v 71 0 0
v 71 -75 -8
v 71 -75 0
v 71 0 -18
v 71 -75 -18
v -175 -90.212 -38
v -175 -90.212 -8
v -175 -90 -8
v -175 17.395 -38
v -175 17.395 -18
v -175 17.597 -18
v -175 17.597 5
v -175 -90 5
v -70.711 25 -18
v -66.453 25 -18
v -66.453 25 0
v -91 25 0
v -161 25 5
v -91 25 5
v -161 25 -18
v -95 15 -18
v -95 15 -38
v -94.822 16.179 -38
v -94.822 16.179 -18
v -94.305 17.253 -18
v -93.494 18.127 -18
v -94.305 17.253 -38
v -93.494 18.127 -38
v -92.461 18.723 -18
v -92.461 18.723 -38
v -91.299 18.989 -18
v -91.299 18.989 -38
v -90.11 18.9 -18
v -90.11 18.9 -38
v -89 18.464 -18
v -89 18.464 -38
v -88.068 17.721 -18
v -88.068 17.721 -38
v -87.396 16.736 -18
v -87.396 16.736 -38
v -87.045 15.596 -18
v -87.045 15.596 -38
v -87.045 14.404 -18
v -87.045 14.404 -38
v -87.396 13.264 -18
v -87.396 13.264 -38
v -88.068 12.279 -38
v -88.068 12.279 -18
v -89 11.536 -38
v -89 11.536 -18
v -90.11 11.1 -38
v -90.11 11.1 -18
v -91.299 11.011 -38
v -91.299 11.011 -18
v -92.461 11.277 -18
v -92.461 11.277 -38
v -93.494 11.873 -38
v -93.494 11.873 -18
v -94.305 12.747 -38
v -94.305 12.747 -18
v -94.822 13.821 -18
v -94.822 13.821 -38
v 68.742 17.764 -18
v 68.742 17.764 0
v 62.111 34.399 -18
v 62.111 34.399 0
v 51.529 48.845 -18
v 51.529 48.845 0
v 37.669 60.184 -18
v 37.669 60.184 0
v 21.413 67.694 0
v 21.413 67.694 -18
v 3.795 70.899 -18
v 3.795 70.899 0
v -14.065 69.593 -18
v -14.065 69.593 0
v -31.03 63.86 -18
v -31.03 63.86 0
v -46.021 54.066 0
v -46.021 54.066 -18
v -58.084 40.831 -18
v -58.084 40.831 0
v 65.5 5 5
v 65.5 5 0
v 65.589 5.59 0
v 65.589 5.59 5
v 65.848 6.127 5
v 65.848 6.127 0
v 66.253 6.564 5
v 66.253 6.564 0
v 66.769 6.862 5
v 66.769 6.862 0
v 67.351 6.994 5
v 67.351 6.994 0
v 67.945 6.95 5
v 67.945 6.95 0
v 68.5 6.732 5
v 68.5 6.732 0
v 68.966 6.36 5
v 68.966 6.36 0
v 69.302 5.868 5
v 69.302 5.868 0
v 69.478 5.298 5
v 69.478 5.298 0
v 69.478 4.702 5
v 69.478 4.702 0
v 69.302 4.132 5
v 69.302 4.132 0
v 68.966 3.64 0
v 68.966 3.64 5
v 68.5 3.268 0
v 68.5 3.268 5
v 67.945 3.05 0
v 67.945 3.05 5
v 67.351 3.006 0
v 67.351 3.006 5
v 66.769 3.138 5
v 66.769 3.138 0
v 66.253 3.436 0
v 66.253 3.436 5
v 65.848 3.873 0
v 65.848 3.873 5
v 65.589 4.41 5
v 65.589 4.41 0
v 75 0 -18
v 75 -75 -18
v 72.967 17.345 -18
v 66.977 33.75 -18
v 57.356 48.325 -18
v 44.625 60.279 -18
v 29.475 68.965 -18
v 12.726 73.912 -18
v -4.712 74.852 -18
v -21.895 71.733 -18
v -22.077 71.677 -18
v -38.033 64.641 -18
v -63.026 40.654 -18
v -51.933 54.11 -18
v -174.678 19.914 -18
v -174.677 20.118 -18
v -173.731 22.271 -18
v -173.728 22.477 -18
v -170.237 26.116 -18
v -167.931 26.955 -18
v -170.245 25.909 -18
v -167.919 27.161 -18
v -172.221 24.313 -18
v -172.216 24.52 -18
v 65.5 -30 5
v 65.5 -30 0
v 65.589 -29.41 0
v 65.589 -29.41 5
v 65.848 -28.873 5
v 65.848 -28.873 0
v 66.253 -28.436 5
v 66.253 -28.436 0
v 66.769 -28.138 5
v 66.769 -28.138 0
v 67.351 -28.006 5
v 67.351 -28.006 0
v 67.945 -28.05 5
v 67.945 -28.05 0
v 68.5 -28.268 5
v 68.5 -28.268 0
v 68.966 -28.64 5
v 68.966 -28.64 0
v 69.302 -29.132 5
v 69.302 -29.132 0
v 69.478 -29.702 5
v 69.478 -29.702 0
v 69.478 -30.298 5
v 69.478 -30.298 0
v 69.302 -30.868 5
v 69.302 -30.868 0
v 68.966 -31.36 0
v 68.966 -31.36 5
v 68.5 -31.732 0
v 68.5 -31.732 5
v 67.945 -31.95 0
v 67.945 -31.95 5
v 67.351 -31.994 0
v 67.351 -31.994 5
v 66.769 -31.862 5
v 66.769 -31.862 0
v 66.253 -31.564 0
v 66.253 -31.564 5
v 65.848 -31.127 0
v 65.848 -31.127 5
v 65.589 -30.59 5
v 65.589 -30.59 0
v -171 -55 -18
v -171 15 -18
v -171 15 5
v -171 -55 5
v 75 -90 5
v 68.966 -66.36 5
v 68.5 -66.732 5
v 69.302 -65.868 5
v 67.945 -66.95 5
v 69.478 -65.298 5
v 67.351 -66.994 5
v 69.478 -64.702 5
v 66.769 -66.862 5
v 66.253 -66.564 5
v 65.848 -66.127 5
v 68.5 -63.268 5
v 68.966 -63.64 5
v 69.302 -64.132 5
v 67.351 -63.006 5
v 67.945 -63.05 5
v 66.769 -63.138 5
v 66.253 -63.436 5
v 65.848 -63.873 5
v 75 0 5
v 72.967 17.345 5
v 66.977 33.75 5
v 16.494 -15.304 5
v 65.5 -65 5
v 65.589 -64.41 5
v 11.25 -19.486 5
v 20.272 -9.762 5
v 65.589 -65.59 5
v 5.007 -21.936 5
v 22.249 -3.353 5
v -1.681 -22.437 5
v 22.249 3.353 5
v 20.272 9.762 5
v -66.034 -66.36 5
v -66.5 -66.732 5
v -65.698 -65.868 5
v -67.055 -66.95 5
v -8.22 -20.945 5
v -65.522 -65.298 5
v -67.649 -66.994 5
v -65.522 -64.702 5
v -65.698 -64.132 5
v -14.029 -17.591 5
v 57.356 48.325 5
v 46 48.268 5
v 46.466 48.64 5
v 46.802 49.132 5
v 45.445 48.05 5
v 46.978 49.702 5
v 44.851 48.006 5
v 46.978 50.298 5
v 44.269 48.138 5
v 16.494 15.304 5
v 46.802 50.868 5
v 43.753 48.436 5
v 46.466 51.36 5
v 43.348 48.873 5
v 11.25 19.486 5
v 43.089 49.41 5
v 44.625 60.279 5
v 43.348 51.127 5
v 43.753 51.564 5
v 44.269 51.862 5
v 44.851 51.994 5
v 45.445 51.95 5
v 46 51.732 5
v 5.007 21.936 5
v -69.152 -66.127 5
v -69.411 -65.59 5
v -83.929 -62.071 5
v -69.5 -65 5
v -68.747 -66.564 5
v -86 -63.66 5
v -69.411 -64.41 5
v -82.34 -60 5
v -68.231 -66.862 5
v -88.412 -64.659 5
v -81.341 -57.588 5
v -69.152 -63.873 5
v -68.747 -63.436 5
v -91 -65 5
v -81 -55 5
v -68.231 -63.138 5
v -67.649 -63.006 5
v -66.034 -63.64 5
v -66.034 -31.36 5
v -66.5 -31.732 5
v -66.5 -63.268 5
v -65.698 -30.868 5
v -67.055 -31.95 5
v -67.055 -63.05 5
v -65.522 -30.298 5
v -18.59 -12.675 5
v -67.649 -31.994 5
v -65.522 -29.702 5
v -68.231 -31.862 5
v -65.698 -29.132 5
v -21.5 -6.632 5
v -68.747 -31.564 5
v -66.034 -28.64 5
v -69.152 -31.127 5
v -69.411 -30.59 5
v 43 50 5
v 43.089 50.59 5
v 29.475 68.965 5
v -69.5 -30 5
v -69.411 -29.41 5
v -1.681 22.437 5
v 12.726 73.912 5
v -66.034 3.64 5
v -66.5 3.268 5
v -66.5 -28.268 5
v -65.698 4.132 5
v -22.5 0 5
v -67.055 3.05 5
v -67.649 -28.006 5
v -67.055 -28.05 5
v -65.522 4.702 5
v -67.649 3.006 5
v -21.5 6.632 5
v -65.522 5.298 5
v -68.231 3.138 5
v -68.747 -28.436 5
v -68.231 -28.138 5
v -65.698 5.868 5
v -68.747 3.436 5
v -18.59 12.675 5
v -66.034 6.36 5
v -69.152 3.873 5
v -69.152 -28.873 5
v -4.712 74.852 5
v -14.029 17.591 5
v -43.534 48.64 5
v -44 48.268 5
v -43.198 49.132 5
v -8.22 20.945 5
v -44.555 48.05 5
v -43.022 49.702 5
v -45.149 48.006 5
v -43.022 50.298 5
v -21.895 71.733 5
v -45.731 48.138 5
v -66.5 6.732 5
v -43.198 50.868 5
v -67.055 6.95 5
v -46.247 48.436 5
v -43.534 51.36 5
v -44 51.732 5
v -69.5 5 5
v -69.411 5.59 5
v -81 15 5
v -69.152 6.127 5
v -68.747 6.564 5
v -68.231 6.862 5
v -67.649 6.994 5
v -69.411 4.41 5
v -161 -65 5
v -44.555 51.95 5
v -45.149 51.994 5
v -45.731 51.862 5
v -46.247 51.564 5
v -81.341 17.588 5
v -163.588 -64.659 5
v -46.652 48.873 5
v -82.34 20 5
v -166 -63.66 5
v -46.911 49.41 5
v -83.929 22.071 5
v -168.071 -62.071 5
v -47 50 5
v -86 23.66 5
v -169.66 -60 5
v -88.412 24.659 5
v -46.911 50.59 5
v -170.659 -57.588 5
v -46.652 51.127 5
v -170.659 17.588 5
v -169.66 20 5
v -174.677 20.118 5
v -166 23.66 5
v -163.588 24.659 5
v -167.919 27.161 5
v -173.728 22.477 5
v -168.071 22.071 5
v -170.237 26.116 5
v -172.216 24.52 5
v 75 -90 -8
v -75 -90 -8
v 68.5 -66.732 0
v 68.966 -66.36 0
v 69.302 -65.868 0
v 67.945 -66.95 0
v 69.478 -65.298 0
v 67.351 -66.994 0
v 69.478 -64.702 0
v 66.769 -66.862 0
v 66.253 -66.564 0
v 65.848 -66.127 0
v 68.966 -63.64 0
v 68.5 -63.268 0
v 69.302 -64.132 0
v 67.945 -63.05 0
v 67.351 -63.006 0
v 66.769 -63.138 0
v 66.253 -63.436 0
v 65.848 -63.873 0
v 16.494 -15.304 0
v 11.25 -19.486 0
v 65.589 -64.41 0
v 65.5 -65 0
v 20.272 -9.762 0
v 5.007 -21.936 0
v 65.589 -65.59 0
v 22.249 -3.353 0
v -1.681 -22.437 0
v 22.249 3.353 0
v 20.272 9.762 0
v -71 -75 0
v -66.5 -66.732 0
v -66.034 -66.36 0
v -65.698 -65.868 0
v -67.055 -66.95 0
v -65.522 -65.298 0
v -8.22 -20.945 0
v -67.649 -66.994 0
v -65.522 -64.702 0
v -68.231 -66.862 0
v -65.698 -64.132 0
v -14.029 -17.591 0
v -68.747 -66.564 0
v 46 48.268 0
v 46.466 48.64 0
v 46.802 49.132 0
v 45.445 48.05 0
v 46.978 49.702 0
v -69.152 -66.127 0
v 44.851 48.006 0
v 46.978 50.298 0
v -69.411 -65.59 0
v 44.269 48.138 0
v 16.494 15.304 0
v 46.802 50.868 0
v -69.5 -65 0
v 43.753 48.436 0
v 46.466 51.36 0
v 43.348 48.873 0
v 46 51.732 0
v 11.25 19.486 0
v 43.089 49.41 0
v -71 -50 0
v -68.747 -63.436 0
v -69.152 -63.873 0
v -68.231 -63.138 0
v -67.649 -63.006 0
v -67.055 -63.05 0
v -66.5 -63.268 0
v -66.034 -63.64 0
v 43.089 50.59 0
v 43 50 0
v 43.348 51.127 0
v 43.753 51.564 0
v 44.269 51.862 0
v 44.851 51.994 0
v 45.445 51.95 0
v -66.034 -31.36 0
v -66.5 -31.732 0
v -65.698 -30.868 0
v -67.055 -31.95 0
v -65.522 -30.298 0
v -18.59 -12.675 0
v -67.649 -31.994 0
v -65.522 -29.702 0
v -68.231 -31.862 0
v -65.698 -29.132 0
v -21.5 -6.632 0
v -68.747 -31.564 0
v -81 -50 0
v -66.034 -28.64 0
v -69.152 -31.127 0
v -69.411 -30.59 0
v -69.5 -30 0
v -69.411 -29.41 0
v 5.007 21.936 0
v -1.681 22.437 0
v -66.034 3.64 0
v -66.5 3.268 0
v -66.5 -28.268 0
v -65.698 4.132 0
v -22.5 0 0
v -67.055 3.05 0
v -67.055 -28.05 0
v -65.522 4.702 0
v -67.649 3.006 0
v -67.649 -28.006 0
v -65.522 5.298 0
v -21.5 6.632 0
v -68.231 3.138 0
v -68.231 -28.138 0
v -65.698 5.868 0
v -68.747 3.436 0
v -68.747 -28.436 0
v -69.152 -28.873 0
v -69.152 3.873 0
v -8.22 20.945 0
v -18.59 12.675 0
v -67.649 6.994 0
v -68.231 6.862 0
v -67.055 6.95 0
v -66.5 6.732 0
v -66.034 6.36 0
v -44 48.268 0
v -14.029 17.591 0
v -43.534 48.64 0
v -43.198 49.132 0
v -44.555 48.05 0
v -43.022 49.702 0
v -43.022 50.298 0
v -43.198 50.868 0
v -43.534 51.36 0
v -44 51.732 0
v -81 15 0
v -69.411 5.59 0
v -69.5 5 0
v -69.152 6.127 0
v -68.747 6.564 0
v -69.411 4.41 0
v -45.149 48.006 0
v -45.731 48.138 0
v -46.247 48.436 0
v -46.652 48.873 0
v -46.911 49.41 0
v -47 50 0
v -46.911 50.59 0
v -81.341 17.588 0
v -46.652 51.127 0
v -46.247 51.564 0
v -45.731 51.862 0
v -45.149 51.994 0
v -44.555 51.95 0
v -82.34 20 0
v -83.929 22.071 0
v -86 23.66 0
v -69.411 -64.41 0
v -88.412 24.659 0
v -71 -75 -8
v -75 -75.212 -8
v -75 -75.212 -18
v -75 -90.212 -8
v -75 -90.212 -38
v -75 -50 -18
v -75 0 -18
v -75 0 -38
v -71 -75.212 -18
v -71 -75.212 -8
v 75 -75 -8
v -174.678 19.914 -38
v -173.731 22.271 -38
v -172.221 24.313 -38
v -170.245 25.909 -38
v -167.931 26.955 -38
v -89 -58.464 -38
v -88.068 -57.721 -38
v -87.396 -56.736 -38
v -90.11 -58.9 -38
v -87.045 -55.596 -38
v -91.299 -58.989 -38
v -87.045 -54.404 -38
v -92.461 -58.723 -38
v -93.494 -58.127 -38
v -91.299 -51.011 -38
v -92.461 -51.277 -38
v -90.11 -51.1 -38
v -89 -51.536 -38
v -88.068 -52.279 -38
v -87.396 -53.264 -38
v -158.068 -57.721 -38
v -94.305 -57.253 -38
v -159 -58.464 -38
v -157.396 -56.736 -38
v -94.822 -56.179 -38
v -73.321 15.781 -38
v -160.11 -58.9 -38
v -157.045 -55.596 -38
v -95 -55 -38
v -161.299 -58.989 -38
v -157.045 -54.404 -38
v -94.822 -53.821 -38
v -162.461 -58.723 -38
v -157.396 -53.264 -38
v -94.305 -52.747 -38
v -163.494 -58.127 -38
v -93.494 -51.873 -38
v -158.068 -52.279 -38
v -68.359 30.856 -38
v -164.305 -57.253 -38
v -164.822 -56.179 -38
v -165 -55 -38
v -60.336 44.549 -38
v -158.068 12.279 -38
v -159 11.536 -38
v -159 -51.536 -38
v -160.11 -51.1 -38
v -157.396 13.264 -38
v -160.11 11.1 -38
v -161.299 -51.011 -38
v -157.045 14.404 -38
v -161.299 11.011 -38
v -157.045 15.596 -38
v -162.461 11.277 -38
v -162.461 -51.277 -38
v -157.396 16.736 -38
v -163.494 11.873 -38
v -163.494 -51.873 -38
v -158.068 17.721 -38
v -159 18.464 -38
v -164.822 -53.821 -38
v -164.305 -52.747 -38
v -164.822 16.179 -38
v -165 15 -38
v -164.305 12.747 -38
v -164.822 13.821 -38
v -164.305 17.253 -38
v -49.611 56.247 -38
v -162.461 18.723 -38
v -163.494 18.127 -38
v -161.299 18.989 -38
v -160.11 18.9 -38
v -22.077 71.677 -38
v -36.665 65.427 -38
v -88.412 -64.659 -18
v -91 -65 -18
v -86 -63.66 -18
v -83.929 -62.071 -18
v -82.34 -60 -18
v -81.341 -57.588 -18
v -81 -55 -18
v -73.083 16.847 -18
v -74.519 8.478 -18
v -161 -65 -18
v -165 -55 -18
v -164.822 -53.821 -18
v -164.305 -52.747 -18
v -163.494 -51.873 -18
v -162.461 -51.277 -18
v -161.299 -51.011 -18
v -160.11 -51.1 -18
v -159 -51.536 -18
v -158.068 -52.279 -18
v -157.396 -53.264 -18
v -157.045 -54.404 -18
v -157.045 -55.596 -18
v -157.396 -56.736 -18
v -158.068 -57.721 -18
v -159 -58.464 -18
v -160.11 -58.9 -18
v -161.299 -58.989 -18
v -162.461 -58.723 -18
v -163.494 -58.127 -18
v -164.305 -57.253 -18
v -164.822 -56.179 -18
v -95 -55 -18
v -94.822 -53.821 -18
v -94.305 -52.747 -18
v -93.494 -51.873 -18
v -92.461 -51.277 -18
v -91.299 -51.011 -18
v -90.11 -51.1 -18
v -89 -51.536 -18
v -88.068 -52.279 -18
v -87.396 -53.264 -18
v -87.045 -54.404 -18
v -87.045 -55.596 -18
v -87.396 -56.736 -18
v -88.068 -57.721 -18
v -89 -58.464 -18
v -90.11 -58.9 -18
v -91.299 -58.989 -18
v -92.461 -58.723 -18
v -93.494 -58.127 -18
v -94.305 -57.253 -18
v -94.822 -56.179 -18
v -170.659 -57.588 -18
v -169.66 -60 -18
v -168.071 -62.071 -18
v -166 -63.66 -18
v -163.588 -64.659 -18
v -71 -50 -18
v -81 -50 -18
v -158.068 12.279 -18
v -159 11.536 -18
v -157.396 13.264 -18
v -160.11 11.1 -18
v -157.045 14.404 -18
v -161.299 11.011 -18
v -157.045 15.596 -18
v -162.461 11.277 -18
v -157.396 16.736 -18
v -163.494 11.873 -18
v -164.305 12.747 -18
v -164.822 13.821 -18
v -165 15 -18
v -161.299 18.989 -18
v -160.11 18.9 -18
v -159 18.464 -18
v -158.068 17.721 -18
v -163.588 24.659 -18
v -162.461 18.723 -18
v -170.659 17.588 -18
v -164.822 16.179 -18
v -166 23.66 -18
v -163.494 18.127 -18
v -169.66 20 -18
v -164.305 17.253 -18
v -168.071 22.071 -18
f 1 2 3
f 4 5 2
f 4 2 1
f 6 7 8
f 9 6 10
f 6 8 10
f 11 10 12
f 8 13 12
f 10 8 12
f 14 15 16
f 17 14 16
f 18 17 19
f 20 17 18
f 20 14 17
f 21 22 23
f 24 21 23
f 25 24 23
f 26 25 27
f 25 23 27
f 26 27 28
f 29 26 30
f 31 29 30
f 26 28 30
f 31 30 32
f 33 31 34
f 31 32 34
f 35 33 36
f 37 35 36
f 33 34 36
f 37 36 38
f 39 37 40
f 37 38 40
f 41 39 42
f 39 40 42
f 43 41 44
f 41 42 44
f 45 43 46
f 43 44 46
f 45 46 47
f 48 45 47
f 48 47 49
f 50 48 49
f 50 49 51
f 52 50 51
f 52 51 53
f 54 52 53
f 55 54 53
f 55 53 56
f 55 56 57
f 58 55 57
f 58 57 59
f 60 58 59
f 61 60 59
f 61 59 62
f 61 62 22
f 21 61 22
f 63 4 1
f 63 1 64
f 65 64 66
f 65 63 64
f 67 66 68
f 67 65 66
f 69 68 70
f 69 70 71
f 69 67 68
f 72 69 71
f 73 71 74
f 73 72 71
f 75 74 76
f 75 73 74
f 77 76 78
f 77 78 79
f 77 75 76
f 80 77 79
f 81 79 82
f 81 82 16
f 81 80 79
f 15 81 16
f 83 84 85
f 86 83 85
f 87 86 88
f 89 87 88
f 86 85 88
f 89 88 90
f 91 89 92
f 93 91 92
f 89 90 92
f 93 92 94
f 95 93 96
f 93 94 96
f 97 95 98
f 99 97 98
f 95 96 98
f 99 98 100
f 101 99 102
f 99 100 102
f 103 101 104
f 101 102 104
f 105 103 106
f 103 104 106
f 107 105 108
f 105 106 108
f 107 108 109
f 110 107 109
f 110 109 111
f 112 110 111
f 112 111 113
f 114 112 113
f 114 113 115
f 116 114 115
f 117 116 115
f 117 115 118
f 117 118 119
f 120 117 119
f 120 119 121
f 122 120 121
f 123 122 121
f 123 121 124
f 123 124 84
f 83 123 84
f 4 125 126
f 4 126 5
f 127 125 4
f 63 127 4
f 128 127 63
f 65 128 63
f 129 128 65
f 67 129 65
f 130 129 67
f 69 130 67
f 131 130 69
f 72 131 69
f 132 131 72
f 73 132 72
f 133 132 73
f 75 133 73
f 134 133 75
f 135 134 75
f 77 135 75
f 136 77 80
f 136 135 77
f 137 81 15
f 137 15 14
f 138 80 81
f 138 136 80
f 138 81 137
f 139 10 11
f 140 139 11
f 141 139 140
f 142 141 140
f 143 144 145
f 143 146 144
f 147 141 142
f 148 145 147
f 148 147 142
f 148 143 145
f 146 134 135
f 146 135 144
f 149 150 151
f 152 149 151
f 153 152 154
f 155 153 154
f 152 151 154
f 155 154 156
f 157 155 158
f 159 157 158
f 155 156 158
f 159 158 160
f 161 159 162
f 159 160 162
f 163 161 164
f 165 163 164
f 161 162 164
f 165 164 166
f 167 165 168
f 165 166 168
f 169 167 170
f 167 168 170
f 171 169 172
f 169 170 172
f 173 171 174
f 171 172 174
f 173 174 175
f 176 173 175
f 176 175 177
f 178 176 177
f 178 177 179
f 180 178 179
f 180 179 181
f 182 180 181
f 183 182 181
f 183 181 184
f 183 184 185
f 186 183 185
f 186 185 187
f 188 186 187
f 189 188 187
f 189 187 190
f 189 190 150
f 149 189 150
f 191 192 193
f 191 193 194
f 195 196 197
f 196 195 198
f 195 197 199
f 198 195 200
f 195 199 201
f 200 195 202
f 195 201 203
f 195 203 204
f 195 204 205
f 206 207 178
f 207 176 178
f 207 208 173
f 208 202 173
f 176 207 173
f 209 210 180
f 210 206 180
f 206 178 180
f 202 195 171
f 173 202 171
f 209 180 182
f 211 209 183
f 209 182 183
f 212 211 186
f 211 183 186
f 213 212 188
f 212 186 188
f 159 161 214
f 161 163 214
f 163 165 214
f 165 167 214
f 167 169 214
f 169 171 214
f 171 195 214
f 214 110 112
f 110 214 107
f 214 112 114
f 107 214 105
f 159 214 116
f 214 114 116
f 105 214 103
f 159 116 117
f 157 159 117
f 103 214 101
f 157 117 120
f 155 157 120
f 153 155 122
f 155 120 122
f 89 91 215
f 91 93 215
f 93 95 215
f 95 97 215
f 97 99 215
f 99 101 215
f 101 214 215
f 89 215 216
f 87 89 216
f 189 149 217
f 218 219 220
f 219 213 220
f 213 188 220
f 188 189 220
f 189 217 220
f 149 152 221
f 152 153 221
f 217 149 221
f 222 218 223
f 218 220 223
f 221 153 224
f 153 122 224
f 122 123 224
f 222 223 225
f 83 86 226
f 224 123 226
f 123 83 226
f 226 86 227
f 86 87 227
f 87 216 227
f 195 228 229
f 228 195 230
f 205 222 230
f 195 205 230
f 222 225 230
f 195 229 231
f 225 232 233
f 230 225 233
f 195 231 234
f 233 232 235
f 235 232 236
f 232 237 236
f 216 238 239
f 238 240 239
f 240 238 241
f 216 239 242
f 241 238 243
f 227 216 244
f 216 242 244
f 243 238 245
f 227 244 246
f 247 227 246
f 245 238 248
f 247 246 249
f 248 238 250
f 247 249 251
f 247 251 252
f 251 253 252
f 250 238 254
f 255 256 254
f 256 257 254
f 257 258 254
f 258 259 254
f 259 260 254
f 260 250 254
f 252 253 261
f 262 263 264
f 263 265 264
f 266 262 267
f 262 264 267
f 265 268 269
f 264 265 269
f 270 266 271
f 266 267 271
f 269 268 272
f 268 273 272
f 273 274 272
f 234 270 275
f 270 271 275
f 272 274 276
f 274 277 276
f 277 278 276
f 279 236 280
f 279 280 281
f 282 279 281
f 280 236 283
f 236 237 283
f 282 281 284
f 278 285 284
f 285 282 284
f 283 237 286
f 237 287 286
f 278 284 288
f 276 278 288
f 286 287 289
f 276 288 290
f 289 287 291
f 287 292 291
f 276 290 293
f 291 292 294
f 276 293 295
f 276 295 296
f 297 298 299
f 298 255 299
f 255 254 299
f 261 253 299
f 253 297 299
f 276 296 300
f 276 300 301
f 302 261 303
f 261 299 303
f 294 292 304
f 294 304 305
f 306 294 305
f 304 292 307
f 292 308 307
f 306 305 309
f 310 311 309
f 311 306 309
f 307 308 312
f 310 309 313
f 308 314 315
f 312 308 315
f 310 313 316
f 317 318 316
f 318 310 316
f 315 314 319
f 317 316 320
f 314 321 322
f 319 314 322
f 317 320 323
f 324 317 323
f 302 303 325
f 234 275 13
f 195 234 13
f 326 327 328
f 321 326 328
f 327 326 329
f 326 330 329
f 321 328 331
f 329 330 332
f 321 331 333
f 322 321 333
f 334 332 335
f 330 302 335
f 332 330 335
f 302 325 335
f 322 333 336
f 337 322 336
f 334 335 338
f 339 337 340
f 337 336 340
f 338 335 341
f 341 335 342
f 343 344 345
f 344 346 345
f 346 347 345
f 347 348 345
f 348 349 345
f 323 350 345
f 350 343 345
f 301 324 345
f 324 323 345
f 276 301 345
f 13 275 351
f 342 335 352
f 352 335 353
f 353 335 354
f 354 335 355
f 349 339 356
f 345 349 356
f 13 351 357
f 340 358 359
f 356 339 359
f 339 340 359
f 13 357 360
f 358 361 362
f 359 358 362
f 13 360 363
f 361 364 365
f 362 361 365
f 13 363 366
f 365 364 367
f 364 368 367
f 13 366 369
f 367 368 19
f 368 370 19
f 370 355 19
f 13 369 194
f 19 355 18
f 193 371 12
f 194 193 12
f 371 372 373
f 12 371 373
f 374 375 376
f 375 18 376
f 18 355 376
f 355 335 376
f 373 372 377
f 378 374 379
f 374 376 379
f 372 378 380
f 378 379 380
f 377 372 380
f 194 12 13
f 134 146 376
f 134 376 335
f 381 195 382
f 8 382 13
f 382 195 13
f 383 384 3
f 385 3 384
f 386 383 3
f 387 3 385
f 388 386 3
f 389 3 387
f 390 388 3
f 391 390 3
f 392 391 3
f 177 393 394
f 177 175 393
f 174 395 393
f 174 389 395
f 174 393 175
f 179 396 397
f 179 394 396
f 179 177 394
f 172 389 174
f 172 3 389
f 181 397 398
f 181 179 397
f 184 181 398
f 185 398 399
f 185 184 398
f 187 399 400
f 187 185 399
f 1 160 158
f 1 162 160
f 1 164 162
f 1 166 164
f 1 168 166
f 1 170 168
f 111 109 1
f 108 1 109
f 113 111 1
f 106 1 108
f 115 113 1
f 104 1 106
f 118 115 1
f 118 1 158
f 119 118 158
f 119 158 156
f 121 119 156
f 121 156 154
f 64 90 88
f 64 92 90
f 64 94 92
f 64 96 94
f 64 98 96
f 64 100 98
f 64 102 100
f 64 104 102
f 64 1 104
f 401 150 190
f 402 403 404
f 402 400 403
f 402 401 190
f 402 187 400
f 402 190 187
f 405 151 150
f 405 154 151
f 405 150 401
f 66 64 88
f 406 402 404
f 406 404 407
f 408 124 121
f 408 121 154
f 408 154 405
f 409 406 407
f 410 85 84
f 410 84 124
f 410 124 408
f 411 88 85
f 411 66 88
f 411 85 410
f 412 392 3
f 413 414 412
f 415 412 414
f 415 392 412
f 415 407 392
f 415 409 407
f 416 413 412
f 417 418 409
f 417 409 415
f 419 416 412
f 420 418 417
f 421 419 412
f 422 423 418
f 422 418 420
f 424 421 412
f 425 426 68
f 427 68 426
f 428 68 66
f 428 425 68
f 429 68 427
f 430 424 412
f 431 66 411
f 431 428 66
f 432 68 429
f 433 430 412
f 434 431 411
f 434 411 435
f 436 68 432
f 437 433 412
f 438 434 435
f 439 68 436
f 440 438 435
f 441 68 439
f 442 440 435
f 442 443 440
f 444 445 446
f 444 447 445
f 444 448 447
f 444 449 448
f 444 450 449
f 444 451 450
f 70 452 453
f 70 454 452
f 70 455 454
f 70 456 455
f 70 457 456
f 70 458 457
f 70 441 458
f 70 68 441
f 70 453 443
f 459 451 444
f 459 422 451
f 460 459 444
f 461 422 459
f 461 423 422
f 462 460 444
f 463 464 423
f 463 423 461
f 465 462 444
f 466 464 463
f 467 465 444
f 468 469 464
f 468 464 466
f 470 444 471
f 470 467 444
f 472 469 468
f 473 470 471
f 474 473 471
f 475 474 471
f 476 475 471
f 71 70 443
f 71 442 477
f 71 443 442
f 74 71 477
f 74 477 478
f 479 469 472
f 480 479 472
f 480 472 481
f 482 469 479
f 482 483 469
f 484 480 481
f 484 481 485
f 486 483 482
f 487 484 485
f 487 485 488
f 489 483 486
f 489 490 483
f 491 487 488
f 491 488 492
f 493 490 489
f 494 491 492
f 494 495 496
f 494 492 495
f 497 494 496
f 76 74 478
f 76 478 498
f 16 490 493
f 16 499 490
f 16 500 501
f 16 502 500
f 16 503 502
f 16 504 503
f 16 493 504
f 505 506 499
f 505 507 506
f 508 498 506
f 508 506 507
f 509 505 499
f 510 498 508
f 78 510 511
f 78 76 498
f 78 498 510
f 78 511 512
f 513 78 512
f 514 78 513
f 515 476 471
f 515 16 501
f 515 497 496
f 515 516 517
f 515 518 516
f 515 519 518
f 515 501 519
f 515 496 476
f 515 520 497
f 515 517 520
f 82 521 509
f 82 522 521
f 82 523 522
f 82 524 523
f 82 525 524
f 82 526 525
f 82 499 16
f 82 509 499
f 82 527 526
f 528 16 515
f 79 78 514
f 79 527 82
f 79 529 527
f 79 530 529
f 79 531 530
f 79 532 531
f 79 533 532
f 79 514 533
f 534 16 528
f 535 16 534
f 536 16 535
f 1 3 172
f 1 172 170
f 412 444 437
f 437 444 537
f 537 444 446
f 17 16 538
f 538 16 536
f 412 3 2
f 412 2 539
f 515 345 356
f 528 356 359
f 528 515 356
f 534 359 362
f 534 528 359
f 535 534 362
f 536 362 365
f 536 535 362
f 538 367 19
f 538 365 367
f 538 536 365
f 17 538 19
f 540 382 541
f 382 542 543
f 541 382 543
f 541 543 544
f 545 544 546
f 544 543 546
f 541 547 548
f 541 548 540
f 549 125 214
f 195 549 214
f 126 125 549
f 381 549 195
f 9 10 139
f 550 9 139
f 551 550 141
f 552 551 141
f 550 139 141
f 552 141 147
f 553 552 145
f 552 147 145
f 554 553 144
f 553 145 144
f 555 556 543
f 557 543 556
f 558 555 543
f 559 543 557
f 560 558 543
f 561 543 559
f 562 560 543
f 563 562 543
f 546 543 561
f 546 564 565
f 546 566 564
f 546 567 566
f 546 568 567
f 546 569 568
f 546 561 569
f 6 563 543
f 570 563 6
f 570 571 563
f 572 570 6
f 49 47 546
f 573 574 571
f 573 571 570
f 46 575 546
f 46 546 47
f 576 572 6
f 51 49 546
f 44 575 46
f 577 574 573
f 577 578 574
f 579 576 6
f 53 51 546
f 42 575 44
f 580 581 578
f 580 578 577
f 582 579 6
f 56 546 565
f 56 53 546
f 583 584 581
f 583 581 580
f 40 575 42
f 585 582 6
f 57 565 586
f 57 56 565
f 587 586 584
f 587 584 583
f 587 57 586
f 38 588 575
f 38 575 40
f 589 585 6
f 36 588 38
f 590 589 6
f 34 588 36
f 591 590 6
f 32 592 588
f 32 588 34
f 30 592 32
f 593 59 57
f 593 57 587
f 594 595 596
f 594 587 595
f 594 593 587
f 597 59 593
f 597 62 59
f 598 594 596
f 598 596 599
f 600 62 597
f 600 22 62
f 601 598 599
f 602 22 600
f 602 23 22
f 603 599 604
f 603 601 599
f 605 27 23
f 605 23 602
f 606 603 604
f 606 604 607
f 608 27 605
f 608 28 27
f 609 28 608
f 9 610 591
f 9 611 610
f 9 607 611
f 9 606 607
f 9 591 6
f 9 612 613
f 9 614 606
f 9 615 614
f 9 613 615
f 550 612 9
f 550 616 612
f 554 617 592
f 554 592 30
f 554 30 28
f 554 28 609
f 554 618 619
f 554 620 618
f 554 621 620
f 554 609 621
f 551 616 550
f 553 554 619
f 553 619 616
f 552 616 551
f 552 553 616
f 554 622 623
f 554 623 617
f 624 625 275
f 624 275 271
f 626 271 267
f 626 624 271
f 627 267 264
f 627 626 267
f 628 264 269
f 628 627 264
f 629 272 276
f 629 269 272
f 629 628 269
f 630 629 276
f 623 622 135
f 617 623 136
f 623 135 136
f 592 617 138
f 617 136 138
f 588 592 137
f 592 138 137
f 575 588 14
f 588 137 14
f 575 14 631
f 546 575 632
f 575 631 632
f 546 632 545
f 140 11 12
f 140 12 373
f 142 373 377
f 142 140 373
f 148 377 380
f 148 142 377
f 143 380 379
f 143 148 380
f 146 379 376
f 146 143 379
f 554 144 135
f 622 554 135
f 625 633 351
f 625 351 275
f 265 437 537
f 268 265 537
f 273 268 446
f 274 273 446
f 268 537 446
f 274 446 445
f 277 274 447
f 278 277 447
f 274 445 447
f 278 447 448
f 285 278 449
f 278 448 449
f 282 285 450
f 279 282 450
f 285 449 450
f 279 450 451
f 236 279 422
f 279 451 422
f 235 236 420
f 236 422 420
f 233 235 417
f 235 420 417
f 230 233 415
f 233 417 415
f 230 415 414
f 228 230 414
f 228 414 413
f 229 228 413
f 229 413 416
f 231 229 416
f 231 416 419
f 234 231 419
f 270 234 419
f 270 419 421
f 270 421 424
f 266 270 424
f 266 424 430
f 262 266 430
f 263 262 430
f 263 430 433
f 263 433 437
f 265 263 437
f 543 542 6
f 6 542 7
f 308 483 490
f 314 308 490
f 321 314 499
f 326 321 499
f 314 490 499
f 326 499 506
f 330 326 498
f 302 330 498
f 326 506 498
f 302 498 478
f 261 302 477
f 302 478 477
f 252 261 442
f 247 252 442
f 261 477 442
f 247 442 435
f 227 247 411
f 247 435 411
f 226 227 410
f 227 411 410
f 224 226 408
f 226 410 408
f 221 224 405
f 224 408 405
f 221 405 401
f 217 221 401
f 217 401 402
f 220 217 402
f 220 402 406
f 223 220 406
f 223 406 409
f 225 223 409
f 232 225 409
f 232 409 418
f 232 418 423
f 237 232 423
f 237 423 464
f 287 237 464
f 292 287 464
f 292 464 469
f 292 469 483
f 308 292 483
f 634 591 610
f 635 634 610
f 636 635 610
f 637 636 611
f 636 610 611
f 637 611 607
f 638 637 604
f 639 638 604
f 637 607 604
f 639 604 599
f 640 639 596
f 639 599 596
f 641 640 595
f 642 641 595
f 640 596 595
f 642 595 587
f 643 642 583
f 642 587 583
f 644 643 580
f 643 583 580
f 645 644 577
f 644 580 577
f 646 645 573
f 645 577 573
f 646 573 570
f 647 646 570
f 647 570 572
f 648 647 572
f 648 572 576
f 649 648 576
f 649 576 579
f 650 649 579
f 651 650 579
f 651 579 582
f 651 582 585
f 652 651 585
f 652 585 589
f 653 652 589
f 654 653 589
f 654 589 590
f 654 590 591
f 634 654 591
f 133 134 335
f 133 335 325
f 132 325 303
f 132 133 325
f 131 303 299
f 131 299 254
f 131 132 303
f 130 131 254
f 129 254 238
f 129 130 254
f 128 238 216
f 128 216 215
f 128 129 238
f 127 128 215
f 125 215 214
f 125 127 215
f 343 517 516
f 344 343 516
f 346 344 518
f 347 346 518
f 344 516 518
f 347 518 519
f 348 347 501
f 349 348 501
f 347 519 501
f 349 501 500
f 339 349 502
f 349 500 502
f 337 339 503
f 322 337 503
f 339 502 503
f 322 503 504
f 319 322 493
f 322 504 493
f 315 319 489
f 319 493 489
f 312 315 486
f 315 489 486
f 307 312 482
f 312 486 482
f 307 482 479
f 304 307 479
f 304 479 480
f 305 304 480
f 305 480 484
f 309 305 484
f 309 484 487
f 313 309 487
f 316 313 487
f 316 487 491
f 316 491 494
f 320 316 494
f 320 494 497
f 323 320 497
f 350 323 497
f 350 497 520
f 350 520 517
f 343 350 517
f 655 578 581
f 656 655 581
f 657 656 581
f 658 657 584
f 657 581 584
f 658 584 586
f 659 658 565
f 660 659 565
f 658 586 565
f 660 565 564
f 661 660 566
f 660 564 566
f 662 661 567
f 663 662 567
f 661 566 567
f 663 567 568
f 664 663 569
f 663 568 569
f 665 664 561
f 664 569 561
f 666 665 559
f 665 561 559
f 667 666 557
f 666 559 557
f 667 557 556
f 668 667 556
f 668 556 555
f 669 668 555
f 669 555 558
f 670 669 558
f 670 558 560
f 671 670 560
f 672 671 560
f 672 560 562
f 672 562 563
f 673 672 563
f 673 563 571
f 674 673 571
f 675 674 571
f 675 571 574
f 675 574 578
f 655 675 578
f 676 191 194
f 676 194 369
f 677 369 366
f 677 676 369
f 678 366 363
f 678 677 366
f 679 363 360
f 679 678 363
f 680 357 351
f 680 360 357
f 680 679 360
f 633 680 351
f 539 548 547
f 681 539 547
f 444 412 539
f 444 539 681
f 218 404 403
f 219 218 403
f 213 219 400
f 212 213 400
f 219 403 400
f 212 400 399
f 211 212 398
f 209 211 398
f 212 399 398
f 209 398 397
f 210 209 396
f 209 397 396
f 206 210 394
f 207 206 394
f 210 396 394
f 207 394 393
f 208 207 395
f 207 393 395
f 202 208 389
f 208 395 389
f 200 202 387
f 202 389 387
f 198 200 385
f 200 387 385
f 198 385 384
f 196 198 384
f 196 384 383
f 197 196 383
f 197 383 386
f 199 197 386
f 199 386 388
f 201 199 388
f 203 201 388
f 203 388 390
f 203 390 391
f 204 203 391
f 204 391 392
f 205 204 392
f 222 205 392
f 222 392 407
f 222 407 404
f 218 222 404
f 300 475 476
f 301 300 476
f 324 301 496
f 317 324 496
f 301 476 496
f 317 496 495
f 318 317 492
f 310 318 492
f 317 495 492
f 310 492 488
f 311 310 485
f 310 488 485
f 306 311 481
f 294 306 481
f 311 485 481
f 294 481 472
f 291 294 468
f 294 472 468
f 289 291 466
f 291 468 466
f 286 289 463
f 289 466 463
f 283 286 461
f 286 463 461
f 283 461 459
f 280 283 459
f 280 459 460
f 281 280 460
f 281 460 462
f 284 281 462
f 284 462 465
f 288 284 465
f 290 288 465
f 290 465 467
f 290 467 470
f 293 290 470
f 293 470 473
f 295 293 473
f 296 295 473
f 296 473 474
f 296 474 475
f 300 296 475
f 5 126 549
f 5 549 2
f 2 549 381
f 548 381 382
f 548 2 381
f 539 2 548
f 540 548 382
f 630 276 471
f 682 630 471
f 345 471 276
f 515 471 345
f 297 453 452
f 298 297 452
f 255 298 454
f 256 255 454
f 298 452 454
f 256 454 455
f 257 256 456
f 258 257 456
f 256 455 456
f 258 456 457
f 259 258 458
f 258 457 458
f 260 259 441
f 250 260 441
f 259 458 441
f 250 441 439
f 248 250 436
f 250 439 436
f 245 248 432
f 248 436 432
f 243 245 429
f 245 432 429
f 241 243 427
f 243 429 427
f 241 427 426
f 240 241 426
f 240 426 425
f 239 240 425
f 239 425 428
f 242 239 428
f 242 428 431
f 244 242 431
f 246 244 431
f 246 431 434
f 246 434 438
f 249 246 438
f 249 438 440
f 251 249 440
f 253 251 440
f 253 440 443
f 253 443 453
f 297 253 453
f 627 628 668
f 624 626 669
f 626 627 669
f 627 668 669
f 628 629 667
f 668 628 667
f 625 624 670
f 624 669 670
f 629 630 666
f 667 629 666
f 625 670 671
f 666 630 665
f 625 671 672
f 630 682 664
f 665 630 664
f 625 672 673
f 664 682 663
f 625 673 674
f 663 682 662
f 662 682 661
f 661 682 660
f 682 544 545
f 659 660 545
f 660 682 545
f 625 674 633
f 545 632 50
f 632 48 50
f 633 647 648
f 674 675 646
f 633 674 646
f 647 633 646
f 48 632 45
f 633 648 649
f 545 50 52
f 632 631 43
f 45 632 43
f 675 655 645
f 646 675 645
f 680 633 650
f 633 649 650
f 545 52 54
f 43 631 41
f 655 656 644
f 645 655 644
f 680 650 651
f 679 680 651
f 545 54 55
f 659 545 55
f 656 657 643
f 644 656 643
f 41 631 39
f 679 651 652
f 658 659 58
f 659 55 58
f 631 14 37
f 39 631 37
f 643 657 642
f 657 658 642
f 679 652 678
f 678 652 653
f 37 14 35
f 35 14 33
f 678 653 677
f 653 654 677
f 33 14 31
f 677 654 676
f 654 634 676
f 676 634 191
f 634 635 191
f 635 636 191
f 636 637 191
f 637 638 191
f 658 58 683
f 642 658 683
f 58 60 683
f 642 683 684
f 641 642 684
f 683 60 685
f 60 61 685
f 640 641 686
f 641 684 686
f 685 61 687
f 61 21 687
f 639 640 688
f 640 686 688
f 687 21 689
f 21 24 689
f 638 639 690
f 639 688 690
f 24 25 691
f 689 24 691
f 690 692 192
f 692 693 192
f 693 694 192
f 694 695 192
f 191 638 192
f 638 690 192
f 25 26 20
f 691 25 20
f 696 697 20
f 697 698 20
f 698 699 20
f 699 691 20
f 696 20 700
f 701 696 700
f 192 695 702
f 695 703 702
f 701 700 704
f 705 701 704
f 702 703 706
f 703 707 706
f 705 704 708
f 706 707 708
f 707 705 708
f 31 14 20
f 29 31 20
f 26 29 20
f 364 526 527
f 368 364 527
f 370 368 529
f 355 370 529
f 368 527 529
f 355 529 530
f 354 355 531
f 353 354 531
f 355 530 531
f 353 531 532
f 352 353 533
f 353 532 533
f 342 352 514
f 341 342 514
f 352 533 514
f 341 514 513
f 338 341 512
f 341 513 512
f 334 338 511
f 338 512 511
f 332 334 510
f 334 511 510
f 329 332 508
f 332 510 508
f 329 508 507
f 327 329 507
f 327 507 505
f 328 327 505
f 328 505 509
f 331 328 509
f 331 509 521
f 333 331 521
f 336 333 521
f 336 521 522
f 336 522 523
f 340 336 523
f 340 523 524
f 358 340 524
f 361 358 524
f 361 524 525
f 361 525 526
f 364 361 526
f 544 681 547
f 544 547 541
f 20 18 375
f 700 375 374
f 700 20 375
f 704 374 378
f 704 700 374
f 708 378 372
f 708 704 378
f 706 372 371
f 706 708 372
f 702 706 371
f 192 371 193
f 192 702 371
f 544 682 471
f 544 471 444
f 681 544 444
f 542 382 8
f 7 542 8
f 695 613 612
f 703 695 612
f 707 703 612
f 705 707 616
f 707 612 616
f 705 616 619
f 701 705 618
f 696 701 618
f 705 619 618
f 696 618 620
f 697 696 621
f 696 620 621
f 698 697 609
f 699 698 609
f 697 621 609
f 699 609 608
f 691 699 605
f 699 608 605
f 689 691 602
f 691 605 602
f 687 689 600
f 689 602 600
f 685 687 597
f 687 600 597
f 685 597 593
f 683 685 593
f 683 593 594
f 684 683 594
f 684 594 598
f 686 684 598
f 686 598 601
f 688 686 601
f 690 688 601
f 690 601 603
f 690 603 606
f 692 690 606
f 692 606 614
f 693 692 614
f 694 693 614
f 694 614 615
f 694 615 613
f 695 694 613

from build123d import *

# Parameters (mm, degrees)
BOSS_EXTRUDE8_DEPTH  = 5
SKETCH18_W           = 250
SKETCH18_H           = 15
BOSS_EXTRUDE9_DEPTH  = 8
SKETCH19_R           = 22.5
SKETCH19_R_2         = 2
CUT_EXTRUDE4_DEPTH   = 8
SKETCH20_R           = 2
CUT_EXTRUDE5_DEPTH   = 8
BOSS_EXTRUDE11_START = 18
BOSS_EXTRUDE11_DEPTH = 18
SKETCH22_W           = 104
SKETCH22_H           = 15.211863575
BOSS_EXTRUDE12_DEPTH = 10
CUT_EXTRUDE6_DEPTH   = 10
BOSS_EXTRUDE13_DEPTH = 20
SKETCH26_R           = 4
CUT_EXTRUDE7_DEPTH   = 30
SKETCH27_W           = 4
SKETCH27_H           = 15
CUT_EXTRUDE8_DEPTH   = 10


# Read off the part's stored shape, not the designer's step: Boss-Extrude13
with BuildPart() as part:
    # Sketch13 → Boss-Extrude8 (new body)
    with BuildSketch(Plane.XY):
        with BuildLine():
            Line((-167.919375153, 27.161249695), (-21.895313644, 71.732804493))
            ThreePointArc((-21.895313644, 71.732804493), (44.625393425, 60.279136205), (75, 0))
            Line((75, 0), (75, -75))
            Line((75, -75), (75, -90))
            Line((75, -90), (-175, -90))
            Line((-175, -90), (-175, -75))
            Line((-175, -75), (-175, 17.596875763))
            ThreePointArc((-175, 17.596875763), (-173.037218161, 23.546928219), (-167.919375153, 27.161249695))
        make_face()
    extrude(amount=BOSS_EXTRUDE8_DEPTH)

    # Sketch18 → Boss-Extrude9 (add)
    with BuildSketch(Plane(origin=(0, 0, 0), x_dir=(-1, 0, 0), z_dir=(0, 0, -1))):
        with Locations((50, -82.5)):
            Rectangle(SKETCH18_W, SKETCH18_H)
    extrude(amount=BOSS_EXTRUDE9_DEPTH)

    # Sketch19 → Cut-Extrude4 (cut)
    with BuildSketch(Plane(origin=(0, 0, 0), x_dir=(-1, 0, 0), z_dir=(0, 0, -1))):
        Circle(SKETCH19_R)
        with Locations((-67.5, -65)):
            Circle(SKETCH19_R_2)
        with Locations((67.5, -65)):
            Circle(SKETCH19_R_2)
        with Locations((67.5, -30)):
            Circle(SKETCH19_R_2)
        with Locations((67.5, 5)):
            Circle(SKETCH19_R_2)
        with Locations((-67.5, -30)):
            Circle(SKETCH19_R_2)
        with Locations((-67.5, 5)):
            Circle(SKETCH19_R_2)
    extrude(amount=-CUT_EXTRUDE4_DEPTH, mode=Mode.SUBTRACT)

    # Sketch20 → Cut-Extrude5 (cut)
    with BuildSketch(Plane(origin=(0, 0, 0), x_dir=(-1, 0, 0), z_dir=(0, 0, -1))):
        with Locations((-45, 50)):
            Circle(SKETCH20_R)
        with Locations((45, 50)):
            Circle(SKETCH20_R)
    extrude(amount=-CUT_EXTRUDE5_DEPTH, mode=Mode.SUBTRACT)

    # Sketch21 → Boss-Extrude11 (add)
    with BuildSketch(Plane(origin=(0, 0, 0), x_dir=(-1, 0, 0), z_dir=(0, 0, -1)).offset(BOSS_EXTRUDE11_START)):
        with BuildLine():
            Line((167.919375153, 27.161249695), (21.895313644, 71.732804493))
            ThreePointArc((21.895313644, 71.732804493), (51.864787491, 54.176044692), (70.710678119, 25))
            Line((70.710678119, 25), (91, 25))
            Line((91, 25), (161, 25))
            ThreePointArc((161, 25), (168.071067812, 22.071067812), (171, 15))
            Line((171, 15), (171, -55))
            ThreePointArc((171, -55), (168.071067812, -62.071067812), (161, -65))
            Line((161, -65), (91, -65))
            ThreePointArc((91, -65), (83.928932188, -62.071067812), (81, -55))
            Line((81, -55), (81, -50))
            Line((81, -50), (71, -50))
            Line((71, -50), (71, -75))
            Line((71, -75), (75, -75))
            Line((75, -75), (85, -75))
            Line((85, -75), (175, -75))
            Line((175, -75), (175, 17.596875763))
            ThreePointArc((175, 17.596875763), (173.037218161, 23.546928219), (167.919375153, 27.161249695))
        make_face()
        with BuildLine():
            ThreePointArc((21.895313644, 71.732804493), (-44.625393425, 60.279136205), (-75, 0))
            Line((-75, 0), (-75, -75))
            Line((-75, -75), (-71, -75))
            Line((-71, -75), (-71, 0))
            ThreePointArc((-71, 0), (-12.705070757, 69.853999006), (66.452990903, 25))
            Line((66.452990903, 25), (70.710678119, 25))
            ThreePointArc((70.710678119, 25), (51.864787491, 54.176044692), (21.895313644, 71.732804493))
        make_face()
    extrude(amount=-BOSS_EXTRUDE11_DEPTH)

    # Sketch22 → Boss-Extrude12 (add)
    with BuildSketch(Plane(origin=(0, 0, -8), x_dir=(-1, 0, 0), z_dir=(0, 0, -1))):
        with Locations((123, -82.605931787)):
            Rectangle(SKETCH22_W, SKETCH22_H)
    extrude(amount=BOSS_EXTRUDE12_DEPTH)

    # Sketch24 → Cut-Extrude6 (cut)
    with BuildSketch(Plane(origin=(0, 0, 0), x_dir=(-1, 0, 0), z_dir=(0, 0, -1))):
        with BuildLine():
            Line((91, 25), (161, 25))
            ThreePointArc((161, 25), (168.071067812, 22.071067812), (171, 15))
            Line((171, 15), (171, -55))
            ThreePointArc((171, -55), (168.071067812, -62.071067812), (161, -65))
            Line((161, -65), (91, -65))
            ThreePointArc((91, -65), (83.928932188, -62.071067812), (81, -55))
            Line((81, -55), (81, 15))
            ThreePointArc((81, 15), (83.928932188, 22.071067812), (91, 25))
        make_face()
    extrude(amount=-CUT_EXTRUDE6_DEPTH, mode=Mode.SUBTRACT)

    # Boss-Extrude13 outline → Boss-Extrude13 (add)
    with BuildSketch(Plane(origin=(0, 0, -18), x_dir=(-1, 0, 0), z_dir=(0, 0, -1))):
        with BuildLine():
            Line((175, -90.211863575), (175, 17.394801859))
            ThreePointArc((175, 17.394801859), (173.040981021, 23.339768152), (167.931475155, 26.955474085))
            Line((167.931475155, 26.955474085), (22.076778478, 71.67716409))
            ThreePointArc((22.076778478, 71.67716409), (60.335554965, 44.549083123), (75, 0))
            Line((75, 0), (75, -90.211863575))
            Line((75, -90.211863575), (175, -90.211863575))
        make_face()
    extrude(amount=BOSS_EXTRUDE13_DEPTH)

    # Sketch26 → Cut-Extrude7 (cut)
    with BuildSketch(Plane(origin=(0, 0, -38), x_dir=(-1, 0, 0), z_dir=(0, 0, -1))):
        with Locations((161, 15)):
            Circle(SKETCH26_R)
        with Locations((91, 15)):
            Circle(SKETCH26_R)
        with Locations((91, -55)):
            Circle(SKETCH26_R)
        with Locations((161, -55)):
            Circle(SKETCH26_R)
    extrude(amount=-CUT_EXTRUDE7_DEPTH, mode=Mode.SUBTRACT)

    # Sketch27 → Cut-Extrude8 (cut)
    with BuildSketch(Plane(origin=(0, 0, -18), x_dir=(-1, 0, 0), z_dir=(0, 0, -1))):
        with Locations((73, -82.711863575)):
            Rectangle(SKETCH27_W, SKETCH27_H)
    extrude(amount=-CUT_EXTRUDE8_DEPTH, mode=Mode.SUBTRACT)


solid = part.part
